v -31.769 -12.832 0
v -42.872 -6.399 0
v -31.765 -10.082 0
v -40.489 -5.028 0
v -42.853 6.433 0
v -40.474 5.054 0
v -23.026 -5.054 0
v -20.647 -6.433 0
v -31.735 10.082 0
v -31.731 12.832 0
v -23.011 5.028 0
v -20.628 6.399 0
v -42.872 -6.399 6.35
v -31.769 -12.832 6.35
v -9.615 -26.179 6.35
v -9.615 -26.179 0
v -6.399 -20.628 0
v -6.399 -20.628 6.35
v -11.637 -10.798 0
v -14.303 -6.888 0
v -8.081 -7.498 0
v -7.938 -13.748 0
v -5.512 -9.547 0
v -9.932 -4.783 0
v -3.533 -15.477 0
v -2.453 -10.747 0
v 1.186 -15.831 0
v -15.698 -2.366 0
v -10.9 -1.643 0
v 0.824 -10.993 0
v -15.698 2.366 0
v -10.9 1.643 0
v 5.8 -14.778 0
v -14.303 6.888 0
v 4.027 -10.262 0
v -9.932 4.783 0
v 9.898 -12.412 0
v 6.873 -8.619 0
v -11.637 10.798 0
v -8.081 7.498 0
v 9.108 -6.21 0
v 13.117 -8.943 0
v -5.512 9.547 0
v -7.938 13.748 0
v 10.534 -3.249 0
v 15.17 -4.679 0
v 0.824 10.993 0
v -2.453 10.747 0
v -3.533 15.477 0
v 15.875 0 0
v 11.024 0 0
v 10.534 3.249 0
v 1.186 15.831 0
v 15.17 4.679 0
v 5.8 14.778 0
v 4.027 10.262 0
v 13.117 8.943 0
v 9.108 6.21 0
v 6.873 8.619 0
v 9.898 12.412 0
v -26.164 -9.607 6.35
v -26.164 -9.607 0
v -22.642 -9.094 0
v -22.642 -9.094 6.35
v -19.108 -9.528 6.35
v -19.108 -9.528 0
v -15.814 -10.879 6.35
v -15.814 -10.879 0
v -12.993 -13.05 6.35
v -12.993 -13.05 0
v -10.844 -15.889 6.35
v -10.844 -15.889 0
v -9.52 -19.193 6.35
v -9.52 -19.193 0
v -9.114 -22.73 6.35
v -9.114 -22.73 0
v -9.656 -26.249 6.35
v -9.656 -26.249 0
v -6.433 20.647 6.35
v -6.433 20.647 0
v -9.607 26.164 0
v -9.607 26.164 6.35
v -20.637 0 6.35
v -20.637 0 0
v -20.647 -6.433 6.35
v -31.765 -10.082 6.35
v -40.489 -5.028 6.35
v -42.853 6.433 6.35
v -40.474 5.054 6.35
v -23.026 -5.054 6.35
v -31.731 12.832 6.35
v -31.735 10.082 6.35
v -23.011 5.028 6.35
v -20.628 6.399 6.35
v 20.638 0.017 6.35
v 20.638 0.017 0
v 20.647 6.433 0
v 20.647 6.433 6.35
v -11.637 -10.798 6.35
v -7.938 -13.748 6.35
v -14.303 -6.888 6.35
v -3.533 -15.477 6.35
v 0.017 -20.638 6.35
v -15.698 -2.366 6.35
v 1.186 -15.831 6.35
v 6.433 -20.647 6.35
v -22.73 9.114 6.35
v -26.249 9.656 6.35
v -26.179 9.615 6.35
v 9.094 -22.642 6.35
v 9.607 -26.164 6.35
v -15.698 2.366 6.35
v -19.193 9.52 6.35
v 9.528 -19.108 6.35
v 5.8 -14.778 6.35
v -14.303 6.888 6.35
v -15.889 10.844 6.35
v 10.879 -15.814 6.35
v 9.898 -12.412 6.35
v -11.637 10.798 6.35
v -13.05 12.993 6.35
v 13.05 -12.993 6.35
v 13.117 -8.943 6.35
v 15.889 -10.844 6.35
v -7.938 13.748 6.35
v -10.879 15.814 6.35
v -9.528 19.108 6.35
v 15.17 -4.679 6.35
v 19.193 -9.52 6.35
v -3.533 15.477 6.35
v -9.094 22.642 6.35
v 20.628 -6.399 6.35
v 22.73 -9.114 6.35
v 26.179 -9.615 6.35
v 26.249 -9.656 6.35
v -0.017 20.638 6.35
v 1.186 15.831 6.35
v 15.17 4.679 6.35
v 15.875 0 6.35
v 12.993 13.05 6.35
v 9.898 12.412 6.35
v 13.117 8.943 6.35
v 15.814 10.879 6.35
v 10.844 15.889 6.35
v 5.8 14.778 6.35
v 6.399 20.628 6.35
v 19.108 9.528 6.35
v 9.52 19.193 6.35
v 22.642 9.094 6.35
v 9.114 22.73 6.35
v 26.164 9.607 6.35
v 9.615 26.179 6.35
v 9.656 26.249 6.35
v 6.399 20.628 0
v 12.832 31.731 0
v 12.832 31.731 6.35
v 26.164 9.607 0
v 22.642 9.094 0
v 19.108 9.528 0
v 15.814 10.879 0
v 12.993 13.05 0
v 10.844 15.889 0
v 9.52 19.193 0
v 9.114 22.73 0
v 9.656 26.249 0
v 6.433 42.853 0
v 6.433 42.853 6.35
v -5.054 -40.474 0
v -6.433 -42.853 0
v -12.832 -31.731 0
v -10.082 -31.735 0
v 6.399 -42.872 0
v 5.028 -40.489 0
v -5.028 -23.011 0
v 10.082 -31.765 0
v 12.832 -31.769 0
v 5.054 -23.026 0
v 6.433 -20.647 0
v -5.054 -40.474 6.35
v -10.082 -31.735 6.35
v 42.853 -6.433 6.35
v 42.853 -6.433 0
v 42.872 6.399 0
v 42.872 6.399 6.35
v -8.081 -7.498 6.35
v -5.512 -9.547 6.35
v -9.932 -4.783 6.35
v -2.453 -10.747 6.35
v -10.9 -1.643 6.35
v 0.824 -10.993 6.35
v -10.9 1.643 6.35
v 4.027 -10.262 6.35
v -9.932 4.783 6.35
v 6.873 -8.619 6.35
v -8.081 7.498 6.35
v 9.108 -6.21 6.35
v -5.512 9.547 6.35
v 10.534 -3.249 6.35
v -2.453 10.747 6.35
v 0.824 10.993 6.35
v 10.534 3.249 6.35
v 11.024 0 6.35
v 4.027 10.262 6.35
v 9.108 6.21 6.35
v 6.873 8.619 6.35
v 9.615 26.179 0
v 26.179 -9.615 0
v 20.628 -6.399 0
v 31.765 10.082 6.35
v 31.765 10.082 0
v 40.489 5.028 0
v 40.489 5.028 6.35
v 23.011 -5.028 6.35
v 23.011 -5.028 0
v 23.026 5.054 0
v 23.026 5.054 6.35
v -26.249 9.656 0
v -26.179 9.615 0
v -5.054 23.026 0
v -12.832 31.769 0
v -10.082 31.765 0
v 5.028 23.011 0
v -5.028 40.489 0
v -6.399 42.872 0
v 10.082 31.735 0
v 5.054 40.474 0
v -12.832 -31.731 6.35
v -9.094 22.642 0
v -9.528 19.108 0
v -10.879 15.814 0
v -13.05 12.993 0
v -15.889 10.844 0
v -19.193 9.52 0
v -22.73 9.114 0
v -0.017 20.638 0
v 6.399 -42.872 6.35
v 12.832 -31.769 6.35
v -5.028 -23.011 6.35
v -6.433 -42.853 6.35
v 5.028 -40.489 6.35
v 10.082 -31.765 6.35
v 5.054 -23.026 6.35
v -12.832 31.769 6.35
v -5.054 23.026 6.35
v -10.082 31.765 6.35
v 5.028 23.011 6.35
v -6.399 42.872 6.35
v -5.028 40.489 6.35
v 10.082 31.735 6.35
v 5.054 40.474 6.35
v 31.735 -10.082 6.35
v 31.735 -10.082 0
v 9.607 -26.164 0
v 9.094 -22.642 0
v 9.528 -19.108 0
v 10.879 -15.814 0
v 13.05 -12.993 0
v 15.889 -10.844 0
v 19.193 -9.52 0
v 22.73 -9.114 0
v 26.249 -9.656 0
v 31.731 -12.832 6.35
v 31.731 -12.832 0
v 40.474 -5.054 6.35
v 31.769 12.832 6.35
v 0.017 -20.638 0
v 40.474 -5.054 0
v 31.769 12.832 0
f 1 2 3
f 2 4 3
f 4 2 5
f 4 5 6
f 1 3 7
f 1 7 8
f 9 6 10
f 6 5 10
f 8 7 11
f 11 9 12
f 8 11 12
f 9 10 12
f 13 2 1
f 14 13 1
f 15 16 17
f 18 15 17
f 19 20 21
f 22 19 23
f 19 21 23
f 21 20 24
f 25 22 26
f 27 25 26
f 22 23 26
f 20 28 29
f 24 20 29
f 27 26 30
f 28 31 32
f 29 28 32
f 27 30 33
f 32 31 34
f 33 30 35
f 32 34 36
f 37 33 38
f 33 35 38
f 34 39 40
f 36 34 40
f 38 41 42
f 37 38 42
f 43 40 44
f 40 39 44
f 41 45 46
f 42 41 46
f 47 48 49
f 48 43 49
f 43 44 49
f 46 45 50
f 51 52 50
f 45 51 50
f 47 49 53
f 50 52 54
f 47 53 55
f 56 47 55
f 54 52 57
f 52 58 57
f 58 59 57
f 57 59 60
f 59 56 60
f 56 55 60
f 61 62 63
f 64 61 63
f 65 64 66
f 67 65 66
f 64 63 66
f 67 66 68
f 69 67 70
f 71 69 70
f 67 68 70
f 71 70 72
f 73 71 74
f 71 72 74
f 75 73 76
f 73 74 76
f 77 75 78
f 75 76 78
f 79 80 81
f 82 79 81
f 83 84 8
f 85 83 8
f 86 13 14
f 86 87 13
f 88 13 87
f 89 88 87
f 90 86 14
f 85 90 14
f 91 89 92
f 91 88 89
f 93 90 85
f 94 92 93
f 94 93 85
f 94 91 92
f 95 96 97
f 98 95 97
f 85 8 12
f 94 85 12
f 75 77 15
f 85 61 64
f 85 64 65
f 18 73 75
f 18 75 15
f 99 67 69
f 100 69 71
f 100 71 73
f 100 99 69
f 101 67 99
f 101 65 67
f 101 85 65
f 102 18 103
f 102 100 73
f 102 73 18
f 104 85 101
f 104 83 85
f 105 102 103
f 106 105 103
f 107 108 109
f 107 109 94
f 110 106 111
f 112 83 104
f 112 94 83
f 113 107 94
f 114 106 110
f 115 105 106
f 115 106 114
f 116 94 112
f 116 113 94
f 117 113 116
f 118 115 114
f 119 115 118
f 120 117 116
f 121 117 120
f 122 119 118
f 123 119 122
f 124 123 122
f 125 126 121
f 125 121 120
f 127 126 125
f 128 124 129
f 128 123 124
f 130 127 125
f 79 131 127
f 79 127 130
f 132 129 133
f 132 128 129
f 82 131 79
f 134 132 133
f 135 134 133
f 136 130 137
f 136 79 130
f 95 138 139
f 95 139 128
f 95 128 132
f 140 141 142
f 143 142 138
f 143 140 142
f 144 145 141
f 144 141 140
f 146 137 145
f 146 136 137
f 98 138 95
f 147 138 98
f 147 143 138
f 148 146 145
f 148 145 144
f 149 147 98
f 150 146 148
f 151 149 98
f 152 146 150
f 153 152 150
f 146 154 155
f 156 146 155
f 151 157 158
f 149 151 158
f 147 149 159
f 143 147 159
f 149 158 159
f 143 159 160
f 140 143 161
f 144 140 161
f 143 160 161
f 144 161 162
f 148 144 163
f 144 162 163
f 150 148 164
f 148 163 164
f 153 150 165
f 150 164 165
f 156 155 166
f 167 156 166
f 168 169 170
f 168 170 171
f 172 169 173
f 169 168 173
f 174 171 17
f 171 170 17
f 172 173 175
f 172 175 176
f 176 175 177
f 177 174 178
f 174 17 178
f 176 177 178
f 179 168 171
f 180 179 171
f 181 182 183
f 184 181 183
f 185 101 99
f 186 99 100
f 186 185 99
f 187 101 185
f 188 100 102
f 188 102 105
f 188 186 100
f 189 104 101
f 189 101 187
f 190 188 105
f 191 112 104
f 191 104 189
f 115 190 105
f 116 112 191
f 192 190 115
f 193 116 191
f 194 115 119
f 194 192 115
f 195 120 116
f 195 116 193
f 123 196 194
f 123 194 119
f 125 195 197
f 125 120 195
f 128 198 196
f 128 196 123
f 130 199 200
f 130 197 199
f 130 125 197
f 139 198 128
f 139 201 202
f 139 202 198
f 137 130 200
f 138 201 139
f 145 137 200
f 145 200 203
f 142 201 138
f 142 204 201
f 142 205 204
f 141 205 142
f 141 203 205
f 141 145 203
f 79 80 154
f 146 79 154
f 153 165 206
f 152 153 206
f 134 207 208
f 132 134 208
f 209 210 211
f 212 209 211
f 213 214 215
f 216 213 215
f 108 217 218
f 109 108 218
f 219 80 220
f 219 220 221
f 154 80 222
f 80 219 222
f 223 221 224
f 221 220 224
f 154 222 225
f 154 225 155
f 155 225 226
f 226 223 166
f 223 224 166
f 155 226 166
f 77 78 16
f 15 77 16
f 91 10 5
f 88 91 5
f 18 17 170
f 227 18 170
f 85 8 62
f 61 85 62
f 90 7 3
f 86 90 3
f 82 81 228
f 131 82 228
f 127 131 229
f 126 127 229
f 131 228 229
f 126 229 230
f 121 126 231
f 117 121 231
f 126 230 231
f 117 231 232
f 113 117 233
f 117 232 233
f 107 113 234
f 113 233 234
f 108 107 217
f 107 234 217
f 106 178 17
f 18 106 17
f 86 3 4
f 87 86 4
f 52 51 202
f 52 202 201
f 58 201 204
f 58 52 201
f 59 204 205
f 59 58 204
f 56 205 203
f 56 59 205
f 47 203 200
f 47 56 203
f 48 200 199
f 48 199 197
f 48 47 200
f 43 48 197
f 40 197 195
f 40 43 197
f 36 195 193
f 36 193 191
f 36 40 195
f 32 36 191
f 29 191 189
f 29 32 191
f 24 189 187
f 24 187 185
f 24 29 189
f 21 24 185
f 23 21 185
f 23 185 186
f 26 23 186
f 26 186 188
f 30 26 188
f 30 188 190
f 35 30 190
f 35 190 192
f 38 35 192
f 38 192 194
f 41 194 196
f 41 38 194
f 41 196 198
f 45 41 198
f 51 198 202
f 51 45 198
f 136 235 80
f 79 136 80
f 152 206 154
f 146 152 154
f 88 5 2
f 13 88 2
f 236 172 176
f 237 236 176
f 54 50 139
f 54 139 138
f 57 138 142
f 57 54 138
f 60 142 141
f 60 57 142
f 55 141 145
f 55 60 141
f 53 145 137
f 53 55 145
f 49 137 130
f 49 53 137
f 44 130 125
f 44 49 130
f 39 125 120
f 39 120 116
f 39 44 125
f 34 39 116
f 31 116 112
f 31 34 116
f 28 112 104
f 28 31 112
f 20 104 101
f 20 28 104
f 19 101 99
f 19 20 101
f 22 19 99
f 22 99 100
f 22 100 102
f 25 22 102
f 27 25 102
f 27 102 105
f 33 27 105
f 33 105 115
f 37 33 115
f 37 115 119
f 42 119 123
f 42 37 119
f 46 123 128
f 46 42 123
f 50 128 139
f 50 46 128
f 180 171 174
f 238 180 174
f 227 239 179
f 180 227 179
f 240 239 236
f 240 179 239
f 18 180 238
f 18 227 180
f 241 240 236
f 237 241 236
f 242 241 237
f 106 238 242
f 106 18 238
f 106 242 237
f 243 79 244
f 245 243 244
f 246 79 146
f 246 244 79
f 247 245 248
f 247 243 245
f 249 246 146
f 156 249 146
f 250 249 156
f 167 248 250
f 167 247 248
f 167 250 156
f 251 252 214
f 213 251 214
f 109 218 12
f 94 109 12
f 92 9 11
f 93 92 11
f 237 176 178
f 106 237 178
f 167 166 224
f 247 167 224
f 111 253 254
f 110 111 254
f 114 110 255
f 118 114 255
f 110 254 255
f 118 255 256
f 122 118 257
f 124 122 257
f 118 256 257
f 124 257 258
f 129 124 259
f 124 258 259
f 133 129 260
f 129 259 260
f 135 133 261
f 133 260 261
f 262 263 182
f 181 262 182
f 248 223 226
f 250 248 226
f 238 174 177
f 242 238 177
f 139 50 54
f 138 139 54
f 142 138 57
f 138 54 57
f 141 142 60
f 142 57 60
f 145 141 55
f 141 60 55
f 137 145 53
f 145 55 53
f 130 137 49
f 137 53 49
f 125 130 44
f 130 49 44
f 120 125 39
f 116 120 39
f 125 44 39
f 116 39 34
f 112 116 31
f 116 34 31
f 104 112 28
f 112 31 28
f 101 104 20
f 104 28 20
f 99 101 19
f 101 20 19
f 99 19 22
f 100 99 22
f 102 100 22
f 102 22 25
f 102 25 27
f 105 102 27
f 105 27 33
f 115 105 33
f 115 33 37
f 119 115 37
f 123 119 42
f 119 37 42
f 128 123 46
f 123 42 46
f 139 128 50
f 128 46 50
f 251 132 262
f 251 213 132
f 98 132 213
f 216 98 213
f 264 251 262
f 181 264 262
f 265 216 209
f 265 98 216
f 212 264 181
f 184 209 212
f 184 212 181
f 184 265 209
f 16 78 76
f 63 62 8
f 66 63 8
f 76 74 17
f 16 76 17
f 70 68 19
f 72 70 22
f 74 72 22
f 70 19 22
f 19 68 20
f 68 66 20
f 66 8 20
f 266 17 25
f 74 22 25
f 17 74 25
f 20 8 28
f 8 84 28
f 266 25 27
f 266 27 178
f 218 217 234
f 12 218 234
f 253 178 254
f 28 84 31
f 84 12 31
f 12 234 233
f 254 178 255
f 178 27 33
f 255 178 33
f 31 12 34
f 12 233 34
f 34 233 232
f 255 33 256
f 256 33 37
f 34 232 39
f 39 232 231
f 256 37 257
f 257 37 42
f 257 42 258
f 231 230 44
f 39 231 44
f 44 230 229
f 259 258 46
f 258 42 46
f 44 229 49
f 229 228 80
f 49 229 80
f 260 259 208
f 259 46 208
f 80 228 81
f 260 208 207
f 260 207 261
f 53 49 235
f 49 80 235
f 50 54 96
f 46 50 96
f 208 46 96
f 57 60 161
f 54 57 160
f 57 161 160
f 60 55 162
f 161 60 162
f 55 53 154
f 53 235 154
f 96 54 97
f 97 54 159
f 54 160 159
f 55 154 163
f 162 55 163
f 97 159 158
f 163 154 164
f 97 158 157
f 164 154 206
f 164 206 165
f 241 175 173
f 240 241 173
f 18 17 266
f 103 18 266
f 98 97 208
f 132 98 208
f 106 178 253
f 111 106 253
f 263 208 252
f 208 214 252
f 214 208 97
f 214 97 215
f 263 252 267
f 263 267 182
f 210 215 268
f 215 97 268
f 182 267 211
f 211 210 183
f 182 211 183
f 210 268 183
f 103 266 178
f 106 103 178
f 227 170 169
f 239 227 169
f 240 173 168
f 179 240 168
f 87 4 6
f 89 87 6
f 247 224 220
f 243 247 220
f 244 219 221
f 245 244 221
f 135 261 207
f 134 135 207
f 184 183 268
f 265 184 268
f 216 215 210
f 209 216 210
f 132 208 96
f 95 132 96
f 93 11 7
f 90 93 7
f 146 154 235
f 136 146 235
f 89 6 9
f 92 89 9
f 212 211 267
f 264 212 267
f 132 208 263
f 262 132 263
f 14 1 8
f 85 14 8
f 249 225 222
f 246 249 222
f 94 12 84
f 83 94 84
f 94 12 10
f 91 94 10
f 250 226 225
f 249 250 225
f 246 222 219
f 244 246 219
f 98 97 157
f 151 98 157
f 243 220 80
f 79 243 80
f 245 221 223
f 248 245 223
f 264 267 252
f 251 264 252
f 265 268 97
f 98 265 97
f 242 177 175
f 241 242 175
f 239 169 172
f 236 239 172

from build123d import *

# Parameters (mm, degrees)
F1_R     = 15.875
F2_DEPTH = 6.35
F0_R     = 15.875
F0_R_2   = 11.0236


# Not quite as in the source:
# - ends of sketch curves that miss each other by under 0.0002 mm in the source are joined


with BuildPart() as f2:
    # F1 (on Top) → F2 (new body)
    with BuildSketch(Plane.XY):
        with BuildLine():
            Line((6.4325482308, -20.6471836189), (9.6068856074, -26.1644869672))
            ThreePointArc((9.6068856074, -26.1644869672), (13.0500837642, -12.9928085244), (26.2491039038, -9.6557918301))
            Line((26.2491039038, -9.6557918301), (26.1792498222, -9.6153210403))
            Line((26.1792498222, -9.6153210403), (20.6278416305, -6.3990469242))
            Line((20.6278416305, -6.3990469242), (20.6375126245, 0.0167504832))
            Line((20.6375126245, 0.0167504832), (20.6471836189, 6.4325482308))
            Line((20.6471836189, 6.4325482308), (26.1644869672, 9.6068856074))
            ThreePointArc((26.1644869672, 9.6068856074), (12.9928085244, 13.0500837642), (9.6557918301, 26.2491039038))
            Line((9.6557918301, 26.2491039038), (9.6153209659, 26.179249694))
            Line((9.6153209659, 26.179249694), (6.3990469242, 20.6278416305))
            Line((6.3990469242, 20.6278416305), (-0.0167505253, 20.6375126245))
            Line((-0.0167505253, 20.6375126245), (-6.4325482308, 20.6471836189))
            Line((-6.4325482308, 20.6471836189), (-9.6068856074, 26.1644869672))
            ThreePointArc((-9.6068856074, 26.1644869672), (-13.0500837642, 12.9928085244), (-26.2491039038, 9.6557918301))
            Line((-26.2491039038, 9.6557918301), (-26.1792498222, 9.6153210403))
            Line((-26.1792498222, 9.6153210403), (-20.6278416305, 6.3990469242))
            Line((-20.6278416305, 6.3990469242), (-20.6374873753, -1.9e-08))
            Line((-20.6374873753, -1.9e-08), (-20.6471836189, -6.4325482308))
            Line((-20.6471836189, -6.4325482308), (-26.1644869672, -9.6068856074))
            ThreePointArc((-26.1644869672, -9.6068856074), (-12.9928085244, -13.0500837642), (-9.6557918301, -26.2491039038))
            Line((-9.6557918301, -26.2491039038), (-9.6153210403, -26.1792498222))
            Line((-9.6153210403, -26.1792498222), (-6.3990469242, -20.6278416305))
            Line((-6.3990469242, -20.6278416305), (0.0167507419, -20.6375126249))
            Line((0.0167507419, -20.6375126249), (6.4325482308, -20.6471836189))
        make_face()
        Circle(F1_R, mode=Mode.SUBTRACT)
    extrude(amount=F2_DEPTH)


with BuildPart() as f2b:
    # F0 (on Top) → F2, piece 2 (new body)
    with BuildSketch(Plane.XY):
        Circle(F0_R)
        Circle(F0_R_2, mode=Mode.SUBTRACT)
    extrude(amount=F2_DEPTH)


with BuildPart() as f2c:
    # F0 (on Top) → F2, piece 3 (new body)
    with BuildSketch(Plane.XY):
        Polygon((6.3990469242, 20.6278416305), (12.831595155, 31.7306580116), (6.4325482308, 42.8528163811), (-6.3990469242, 42.8721583695), (-12.831595155, 31.7693419884), (-6.4325482308, 20.6471836189), align=None)
        Polygon((-5.0278225833, 40.4888387189), (5.0541450385, 40.4736414423), (10.0819676218, 31.7348027234), (5.0278225833, 23.0111612811), (-5.0541450385, 23.0263585577), (-10.0819676218, 31.7651972766), align=None, mode=Mode.SUBTRACT)
    extrude(amount=F2_DEPTH)


with BuildPart() as f2d:
    # F0 (on Top) → F2, piece 4 (new body)
    with BuildSketch(Plane.XY):
        Polygon((31.7693419884, 12.831595155), (20.6471836189, 6.4325482308), (20.6278416305, -6.3990469242), (31.7306580116, -12.831595155), (42.8528163811, -6.4325482308), (42.8721583695, 6.3990469242), align=None)
        Polygon((31.7348027234, -10.0819676218), (23.0111612811, -5.0278225833), (23.0263585577, 5.0541450385), (31.7651972766, 10.0819676218), (40.4888387189, 5.0278225833), (40.4736414423, -5.0541450385), align=None, mode=Mode.SUBTRACT)
    extrude(amount=F2_DEPTH)


with BuildPart() as f2e:
    # F0 (on Top) → F2, piece 5 (new body)
    with BuildSketch(Plane.XY):
        Polygon((12.831595155, -31.7693419884), (6.4325482308, -20.6471836189), (-6.3990469242, -20.6278416305), (-12.831595155, -31.7306580116), (-6.4325482308, -42.8528163811), (6.3990469242, -42.8721583695), align=None)
        Polygon((-10.0819676218, -31.7348027234), (-5.0278225833, -23.0111612811), (5.0541450385, -23.0263585577), (10.0819676218, -31.7651972766), (5.0278225833, -40.4888387189), (-5.0541450385, -40.4736414423), align=None, mode=Mode.SUBTRACT)
    extrude(amount=F2_DEPTH)


with BuildPart() as f2f:
    # F0 (on Top) → F2, piece 6 (new body)
    with BuildSketch(Plane.XY):
        Polygon((-31.7693419884, -12.831595155), (-20.6471836189, -6.4325482308), (-20.6278416305, 6.3990469242), (-31.7306580116, 12.831595155), (-42.8528163811, 6.4325482308), (-42.8721583695, -6.3990469242), align=None)
        Polygon((-31.7348027234, 10.0819676218), (-23.0111612811, 5.0278225833), (-23.0263585577, -5.0541450385), (-31.7651972766, -10.0819676218), (-40.4888387189, -5.0278225833), (-40.4736414423, 5.0541450385), align=None, mode=Mode.SUBTRACT)
    extrude(amount=F2_DEPTH)


solid = Compound([f2.part, f2b.part, f2c.part, f2d.part, f2e.part, f2f.part])
